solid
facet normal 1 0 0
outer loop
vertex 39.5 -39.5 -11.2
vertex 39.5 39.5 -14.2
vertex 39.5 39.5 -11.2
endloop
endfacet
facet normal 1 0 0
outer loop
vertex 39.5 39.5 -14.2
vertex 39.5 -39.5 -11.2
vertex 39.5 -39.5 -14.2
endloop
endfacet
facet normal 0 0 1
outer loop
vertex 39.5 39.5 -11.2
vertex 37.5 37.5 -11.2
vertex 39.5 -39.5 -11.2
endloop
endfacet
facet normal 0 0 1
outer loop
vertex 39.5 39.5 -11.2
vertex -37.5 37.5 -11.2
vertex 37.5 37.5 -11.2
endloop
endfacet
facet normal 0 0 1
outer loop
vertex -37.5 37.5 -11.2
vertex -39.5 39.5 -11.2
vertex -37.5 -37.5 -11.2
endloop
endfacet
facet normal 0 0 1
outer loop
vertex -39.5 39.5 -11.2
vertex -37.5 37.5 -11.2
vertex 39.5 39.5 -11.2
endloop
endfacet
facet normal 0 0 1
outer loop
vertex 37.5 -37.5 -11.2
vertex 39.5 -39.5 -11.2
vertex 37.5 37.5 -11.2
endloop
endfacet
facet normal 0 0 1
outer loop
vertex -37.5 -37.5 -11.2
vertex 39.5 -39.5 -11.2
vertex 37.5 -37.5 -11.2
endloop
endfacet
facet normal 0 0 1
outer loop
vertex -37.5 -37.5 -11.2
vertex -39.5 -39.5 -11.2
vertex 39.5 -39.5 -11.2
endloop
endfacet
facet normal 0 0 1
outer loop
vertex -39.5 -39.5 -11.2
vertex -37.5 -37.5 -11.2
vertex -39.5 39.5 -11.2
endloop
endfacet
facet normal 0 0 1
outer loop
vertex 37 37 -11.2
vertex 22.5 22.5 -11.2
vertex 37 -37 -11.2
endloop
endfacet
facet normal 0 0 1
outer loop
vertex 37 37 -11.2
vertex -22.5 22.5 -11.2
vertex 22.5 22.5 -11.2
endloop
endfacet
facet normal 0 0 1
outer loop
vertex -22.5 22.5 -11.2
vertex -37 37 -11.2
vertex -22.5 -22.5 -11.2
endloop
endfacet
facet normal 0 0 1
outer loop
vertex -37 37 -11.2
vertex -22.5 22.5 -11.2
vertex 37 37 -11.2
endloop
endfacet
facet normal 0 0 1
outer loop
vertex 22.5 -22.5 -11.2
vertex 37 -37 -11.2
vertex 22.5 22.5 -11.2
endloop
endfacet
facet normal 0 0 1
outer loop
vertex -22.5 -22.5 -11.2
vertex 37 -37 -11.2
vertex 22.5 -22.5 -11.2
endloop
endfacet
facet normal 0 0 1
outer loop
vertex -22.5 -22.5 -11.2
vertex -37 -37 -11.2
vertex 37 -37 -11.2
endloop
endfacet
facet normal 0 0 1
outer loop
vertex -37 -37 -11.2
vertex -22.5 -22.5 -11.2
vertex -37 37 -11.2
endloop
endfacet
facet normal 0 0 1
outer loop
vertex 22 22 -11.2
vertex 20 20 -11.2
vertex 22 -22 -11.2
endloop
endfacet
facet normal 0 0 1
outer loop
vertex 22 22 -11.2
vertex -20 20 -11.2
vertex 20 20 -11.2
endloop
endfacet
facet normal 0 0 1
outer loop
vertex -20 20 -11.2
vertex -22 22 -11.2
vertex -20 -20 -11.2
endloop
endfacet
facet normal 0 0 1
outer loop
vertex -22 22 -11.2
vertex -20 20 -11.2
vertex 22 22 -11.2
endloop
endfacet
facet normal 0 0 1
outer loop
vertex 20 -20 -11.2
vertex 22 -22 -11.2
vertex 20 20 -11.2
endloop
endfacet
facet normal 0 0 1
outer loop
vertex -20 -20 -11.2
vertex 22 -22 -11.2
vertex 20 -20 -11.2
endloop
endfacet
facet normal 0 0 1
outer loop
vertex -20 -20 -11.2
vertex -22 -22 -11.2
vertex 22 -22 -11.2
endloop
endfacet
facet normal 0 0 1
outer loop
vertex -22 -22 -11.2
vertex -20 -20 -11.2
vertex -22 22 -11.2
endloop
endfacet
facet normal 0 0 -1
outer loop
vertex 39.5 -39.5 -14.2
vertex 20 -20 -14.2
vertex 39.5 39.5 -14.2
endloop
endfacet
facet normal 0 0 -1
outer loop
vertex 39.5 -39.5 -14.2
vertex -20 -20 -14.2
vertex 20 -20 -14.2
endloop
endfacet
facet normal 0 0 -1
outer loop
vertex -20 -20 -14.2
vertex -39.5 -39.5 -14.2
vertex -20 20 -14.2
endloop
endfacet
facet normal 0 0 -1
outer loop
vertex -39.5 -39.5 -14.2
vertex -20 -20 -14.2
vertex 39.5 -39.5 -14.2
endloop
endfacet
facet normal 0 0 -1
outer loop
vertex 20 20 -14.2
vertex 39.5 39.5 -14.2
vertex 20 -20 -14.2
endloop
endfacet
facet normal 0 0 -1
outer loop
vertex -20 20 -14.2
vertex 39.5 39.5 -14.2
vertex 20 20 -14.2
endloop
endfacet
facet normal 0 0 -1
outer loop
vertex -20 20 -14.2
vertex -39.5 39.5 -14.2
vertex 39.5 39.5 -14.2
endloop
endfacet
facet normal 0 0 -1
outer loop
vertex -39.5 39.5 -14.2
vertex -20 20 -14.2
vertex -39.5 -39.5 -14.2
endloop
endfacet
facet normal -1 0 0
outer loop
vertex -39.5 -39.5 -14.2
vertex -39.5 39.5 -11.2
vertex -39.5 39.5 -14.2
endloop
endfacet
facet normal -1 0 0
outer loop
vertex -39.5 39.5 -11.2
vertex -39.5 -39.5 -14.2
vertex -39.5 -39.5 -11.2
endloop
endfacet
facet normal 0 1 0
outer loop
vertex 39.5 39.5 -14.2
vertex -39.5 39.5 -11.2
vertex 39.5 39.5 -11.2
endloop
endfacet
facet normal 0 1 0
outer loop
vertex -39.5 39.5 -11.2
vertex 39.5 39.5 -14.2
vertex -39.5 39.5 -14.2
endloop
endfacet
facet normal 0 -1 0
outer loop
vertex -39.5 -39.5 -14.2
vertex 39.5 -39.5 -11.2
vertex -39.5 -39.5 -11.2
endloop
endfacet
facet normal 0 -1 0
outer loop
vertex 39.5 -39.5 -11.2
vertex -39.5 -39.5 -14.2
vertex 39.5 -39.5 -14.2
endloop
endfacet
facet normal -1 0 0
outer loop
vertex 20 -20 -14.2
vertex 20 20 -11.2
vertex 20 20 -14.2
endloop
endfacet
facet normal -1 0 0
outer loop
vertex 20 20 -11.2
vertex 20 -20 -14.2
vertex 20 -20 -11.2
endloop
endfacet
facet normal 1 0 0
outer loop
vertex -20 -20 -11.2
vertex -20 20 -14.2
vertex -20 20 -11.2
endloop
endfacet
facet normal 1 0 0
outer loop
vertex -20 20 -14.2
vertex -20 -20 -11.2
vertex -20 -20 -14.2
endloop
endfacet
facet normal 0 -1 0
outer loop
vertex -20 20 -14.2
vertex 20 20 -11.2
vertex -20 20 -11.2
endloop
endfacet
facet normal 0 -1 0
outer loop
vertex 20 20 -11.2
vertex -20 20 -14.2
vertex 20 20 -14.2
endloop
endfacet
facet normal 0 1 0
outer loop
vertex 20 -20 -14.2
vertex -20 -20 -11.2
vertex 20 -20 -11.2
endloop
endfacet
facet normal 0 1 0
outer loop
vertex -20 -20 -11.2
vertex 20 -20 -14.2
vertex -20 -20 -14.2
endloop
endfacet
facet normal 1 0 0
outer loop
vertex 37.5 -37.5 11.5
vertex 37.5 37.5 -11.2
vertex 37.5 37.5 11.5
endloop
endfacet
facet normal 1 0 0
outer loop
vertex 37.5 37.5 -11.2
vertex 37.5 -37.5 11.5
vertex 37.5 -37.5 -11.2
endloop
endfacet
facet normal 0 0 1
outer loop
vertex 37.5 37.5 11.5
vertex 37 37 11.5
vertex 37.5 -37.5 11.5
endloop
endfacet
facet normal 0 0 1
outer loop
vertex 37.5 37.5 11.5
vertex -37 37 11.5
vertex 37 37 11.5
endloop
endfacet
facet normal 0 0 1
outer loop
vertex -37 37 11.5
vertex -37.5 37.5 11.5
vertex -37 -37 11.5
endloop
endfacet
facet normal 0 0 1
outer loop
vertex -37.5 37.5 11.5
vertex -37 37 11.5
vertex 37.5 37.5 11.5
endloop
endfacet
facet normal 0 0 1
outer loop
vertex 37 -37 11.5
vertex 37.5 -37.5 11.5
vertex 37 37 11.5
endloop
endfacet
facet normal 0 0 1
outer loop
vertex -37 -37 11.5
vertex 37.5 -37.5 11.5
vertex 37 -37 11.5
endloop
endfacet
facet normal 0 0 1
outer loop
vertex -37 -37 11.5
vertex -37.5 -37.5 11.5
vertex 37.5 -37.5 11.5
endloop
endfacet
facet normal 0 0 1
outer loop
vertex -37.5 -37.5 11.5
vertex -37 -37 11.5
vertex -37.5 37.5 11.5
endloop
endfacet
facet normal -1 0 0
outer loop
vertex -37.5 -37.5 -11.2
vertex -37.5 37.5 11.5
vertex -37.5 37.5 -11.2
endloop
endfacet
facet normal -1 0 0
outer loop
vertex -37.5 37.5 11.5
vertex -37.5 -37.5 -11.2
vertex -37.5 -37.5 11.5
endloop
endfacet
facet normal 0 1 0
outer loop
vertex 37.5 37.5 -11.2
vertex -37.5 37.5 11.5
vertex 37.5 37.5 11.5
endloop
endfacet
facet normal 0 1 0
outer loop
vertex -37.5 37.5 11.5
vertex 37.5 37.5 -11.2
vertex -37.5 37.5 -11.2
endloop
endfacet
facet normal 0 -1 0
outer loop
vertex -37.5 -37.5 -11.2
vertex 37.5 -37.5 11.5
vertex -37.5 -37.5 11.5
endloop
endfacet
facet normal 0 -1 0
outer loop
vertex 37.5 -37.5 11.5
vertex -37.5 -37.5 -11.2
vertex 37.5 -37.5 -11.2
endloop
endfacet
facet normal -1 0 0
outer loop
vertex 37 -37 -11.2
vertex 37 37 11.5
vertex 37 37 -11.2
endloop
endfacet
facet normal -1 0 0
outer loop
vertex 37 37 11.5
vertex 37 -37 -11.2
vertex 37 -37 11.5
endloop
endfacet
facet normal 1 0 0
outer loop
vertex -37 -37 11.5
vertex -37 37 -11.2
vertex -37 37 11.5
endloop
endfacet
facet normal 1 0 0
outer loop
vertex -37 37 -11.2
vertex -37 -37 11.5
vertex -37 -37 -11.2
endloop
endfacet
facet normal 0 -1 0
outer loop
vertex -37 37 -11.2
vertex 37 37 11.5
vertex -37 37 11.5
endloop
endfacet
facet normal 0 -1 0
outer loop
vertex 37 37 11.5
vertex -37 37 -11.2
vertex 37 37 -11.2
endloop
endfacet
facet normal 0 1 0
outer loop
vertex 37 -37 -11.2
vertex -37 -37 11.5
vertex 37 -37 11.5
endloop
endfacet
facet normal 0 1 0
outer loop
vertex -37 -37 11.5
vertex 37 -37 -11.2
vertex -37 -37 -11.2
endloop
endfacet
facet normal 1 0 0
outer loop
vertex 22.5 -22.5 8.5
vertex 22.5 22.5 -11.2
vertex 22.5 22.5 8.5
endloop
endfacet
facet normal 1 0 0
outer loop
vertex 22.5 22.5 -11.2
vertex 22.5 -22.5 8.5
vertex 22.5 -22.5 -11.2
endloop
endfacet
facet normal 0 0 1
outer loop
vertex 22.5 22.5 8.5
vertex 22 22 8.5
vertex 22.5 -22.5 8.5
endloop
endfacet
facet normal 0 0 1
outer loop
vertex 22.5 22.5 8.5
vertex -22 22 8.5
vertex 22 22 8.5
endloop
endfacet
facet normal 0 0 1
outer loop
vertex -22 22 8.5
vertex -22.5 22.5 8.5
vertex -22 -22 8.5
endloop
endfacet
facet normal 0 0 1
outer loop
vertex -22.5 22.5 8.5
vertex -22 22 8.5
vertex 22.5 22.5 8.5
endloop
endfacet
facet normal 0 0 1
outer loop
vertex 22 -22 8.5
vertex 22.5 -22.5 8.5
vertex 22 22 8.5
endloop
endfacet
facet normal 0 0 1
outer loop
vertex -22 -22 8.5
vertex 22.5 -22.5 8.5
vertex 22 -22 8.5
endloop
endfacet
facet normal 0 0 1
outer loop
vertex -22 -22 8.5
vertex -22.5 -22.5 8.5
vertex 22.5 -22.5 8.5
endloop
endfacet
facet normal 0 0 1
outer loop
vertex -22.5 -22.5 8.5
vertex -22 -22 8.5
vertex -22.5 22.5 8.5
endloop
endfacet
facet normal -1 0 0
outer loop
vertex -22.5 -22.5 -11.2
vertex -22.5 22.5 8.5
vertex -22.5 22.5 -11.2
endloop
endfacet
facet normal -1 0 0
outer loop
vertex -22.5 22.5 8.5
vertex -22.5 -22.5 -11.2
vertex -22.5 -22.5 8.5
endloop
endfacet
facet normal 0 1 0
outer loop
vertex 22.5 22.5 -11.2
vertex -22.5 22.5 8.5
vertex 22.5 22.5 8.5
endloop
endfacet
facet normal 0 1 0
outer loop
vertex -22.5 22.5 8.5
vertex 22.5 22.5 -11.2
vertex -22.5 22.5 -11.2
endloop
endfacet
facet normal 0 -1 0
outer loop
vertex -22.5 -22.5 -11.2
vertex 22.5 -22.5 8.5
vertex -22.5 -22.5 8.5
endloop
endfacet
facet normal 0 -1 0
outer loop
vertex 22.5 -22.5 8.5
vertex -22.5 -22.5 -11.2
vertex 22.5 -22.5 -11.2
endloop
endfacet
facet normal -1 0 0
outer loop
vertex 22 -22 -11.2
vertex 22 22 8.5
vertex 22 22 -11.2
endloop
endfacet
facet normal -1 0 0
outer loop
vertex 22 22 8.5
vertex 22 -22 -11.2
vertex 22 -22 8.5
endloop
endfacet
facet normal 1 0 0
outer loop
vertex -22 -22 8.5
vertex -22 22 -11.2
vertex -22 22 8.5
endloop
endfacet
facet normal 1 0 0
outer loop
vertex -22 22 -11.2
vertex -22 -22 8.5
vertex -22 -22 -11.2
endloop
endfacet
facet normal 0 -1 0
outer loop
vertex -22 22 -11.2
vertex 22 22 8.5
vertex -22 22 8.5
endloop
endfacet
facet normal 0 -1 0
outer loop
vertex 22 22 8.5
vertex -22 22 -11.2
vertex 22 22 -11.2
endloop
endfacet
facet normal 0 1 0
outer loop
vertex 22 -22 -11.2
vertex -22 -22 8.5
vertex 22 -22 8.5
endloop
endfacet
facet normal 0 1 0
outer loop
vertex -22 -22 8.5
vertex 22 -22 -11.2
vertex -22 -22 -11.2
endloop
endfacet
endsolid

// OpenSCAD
// [FL_INDEX: keywords="openscad, 3d_parametric, Square_Cookie_Cutter, csg_solid" | COT="Parametric OpenSCAD design from 3DCodeverse"]
// Title: Square Cookie Cutter

// Copyright (c) 2013, 2014 by Jean-Louis Paquelin (jlp6k).
// This work is licensed under the Creative Commons Attribution
// Partage dans les Mêmes Conditions 3.0 France License.
// To view a copy of this license, visit http://creativecommons.org/licenses/by-sa/3.0/fr/
// CC-BY-SA

// Created 2013-11-29
// Last modified 2014-02-15

// dimensions are set in millimeters

Has_Inner_Cutter = "yes"; // [yes:Output will have an inner cutter, no: simple cookie cutter]

Cutter_Thickness = 0.5;

Outer_Side = 75;
Outer_Height = 23;

Inner_Side_Difference = 15;
Inner_Height_Difference = 3;

Frame_Thickness = 3;
Frame_Flange = 2;

union() {
    // grip / frame
    translate([0, 0, -(Outer_Height / 2) - (Frame_Thickness / 2) + (Frame_Thickness / 10)])
        difference() {
            cube([Outer_Side + Frame_Flange * 2, 
                  Outer_Side + Frame_Flange * 2,
                  Frame_Thickness],
                  center = true);

            if(Has_Inner_Cutter == "yes") {
                cube([Outer_Side - Inner_Side_Difference * 2 - Cutter_Thickness * 2 - Frame_Flange * 2, 
                      Outer_Side - Inner_Side_Difference * 2 - Cutter_Thickness * 2 - Frame_Flange * 2,
                      Frame_Thickness + 1],
                      center = true);
            } else {
                cube([Outer_Side - Cutter_Thickness * 2 - Frame_Flange * 2, 
                      Outer_Side - Cutter_Thickness * 2 - Frame_Flange * 2,
                      Frame_Thickness + 1],
                      center = true);
                
            }
        }

    // outer cutter
    difference() {
        cube([Outer_Side,
              Outer_Side, 
              Outer_Height],
              center = true);
        cube([Outer_Side - Cutter_Thickness * 2,
              Outer_Side - Cutter_Thickness * 2,
              Outer_Height + 10],
              center = true);
    }


    if(Has_Inner_Cutter == "yes") {
        // inner cutter
        translate([0, 0,  -Inner_Height_Difference / 2])
            difference() {
                cube([Outer_Side - Inner_Side_Difference * 2,
                      Outer_Side - Inner_Side_Difference * 2,
                      Outer_Height - Inner_Height_Difference],
                      center = true);
                cube([Outer_Side - Inner_Side_Difference * 2 - Cutter_Thickness * 2,
                      Outer_Side - Inner_Side_Difference * 2 - Cutter_Thickness * 2,
                      Outer_Height - Inner_Height_Difference + 10],
                      center = true);
            }
    }
}
